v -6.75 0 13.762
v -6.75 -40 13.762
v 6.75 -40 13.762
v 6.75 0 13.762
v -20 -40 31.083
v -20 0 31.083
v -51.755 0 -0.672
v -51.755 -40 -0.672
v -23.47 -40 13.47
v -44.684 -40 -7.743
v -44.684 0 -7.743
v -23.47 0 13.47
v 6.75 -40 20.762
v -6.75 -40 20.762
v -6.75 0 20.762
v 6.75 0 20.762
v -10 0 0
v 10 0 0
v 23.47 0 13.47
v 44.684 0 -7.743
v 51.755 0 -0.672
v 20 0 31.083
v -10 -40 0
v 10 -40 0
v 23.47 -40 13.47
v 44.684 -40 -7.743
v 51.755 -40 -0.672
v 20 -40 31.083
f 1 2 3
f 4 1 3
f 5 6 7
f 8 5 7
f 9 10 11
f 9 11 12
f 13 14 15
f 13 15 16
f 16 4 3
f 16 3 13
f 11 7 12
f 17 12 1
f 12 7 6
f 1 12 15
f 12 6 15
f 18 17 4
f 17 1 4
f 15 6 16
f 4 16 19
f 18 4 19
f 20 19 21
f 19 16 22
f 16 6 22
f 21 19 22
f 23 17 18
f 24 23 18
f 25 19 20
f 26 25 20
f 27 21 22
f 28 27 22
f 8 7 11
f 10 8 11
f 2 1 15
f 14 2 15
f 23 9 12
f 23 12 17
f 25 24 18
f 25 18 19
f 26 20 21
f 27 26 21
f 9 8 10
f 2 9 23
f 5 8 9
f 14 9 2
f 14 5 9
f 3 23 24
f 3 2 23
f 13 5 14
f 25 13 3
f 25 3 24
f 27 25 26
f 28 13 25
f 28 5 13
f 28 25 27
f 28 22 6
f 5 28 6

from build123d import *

# Parameters (mm, degrees)
F0_W     = 13.5
F0_H     = 7
F1_DEPTH = 40


with BuildPart() as f1:
    # F0 (on Front) → F1 (new body)
    with BuildSketch(Plane.XZ):
        Polygon((-10, 0), (0, 0), (10, 0), (23.470384, 13.470384), (44.683588, -7.742819), (51.754655, -0.671751), (20, 31.082904), (0, 31.082904), (-20, 31.082904), (-51.754655, -0.671751), (-44.683588, -7.742819), (-23.470384, 13.470384), align=None)
        with Locations((0, 17.262155)):
            Rectangle(F0_W, F0_H, mode=Mode.SUBTRACT)
    extrude(amount=F1_DEPTH)


solid = f1.part
